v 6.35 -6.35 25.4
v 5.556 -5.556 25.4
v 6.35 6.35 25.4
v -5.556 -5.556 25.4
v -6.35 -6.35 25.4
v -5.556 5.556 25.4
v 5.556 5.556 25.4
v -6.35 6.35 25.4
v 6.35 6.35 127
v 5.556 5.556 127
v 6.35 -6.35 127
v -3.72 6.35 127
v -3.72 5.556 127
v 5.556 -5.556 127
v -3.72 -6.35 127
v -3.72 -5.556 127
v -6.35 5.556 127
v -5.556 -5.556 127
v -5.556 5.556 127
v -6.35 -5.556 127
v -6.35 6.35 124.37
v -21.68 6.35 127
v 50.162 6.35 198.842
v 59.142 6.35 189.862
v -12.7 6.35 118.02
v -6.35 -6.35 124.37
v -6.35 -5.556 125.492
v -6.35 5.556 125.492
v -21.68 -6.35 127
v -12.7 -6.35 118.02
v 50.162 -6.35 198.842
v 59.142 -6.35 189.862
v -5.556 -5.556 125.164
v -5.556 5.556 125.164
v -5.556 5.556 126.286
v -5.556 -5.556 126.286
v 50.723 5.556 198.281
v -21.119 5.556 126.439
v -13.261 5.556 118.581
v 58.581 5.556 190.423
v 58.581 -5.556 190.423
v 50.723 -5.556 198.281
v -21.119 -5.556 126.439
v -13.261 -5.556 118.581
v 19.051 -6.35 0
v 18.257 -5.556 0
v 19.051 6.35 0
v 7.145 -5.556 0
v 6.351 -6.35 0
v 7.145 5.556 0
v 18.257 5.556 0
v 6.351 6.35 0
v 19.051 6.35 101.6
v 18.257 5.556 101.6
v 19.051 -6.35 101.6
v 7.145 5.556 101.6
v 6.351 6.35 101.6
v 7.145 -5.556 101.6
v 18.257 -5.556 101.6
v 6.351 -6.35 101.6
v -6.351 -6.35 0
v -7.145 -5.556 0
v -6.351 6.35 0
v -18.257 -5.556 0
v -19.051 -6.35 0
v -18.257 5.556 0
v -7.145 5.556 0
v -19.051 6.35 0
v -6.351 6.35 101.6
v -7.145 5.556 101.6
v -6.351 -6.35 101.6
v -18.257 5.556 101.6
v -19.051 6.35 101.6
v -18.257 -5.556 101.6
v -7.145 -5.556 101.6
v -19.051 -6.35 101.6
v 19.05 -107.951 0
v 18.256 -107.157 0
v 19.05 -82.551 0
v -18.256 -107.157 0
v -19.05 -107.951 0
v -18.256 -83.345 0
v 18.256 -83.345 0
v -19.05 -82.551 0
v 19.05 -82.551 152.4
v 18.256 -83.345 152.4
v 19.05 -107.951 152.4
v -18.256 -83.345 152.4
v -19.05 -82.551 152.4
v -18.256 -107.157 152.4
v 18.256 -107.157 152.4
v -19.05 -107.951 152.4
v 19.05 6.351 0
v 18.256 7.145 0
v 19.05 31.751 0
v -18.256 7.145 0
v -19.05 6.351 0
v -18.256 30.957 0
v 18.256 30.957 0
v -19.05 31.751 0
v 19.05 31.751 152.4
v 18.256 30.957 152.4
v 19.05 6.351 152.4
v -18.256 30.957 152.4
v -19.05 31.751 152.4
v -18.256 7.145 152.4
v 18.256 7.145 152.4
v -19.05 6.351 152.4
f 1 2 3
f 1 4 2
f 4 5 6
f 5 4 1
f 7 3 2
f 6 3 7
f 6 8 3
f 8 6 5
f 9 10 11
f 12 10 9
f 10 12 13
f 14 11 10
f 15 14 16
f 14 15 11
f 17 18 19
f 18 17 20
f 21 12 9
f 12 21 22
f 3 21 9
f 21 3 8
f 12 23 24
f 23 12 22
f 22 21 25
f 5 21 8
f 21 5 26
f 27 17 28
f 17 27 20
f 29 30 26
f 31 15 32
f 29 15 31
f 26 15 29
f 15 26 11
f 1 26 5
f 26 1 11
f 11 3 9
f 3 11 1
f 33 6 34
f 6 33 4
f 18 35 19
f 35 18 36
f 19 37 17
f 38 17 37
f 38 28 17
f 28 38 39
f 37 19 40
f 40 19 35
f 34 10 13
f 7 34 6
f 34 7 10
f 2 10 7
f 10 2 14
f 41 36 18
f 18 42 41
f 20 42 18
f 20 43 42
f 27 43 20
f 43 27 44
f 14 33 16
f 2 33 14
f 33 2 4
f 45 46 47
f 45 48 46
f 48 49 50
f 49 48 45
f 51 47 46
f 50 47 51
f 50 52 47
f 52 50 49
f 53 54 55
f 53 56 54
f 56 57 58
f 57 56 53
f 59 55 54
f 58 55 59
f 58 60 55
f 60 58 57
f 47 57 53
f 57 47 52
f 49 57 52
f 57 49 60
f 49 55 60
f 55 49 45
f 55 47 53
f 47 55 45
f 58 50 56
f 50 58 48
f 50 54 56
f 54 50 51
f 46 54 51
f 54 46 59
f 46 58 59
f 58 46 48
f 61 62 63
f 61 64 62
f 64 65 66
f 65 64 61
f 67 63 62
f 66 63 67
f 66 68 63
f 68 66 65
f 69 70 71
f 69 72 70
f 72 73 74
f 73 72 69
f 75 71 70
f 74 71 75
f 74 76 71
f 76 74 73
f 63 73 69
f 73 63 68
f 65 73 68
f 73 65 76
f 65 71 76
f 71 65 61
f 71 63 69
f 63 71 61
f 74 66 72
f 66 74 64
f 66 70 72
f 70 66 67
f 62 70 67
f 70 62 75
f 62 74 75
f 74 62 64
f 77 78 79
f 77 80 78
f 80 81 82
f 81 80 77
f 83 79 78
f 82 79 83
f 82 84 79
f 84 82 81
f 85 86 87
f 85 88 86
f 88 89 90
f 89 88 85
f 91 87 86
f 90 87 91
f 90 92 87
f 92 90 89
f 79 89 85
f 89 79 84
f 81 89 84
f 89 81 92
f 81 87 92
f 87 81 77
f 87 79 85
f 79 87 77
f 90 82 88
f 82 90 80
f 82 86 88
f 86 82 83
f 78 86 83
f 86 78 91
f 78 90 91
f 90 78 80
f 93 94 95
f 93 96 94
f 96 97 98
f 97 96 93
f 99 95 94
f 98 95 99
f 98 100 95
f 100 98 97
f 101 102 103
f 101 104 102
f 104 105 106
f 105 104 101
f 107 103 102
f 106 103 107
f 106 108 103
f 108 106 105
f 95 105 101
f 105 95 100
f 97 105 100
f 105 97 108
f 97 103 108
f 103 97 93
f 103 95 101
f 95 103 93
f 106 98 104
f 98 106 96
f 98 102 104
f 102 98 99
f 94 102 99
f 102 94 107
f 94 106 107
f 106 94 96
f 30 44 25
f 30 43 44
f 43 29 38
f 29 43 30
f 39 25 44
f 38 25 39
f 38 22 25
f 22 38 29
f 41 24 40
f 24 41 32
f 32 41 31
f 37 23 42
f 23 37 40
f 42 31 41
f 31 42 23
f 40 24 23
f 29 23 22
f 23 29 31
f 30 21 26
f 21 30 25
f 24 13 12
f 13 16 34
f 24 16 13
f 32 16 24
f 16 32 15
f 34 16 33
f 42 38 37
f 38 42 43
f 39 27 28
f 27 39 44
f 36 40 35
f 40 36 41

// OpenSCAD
eps = 0.001;

module alum_extrusion(height, width, wall_thickness, length) {
    color([0.8, 0.8, 0.8, 0.5])
    linear_extrude(length, center=true) {
        difference() {
            square([width, height], center=true);
            square([width - wall_thickness, height - wall_thickness], center=true);
        }
    }
}

module alum_half_by_half(height) {
    alum_extrusion(0.5*25.4, 0.5*25.4, 1/16*25.4, height);
}
module alum_one_by_one_and_half(height) {
    alum_extrusion(1*25.4, 1.5*25.4, 1/16*25.4, height);
}


translate([0, 0, 3*25.4])
    alum_half_by_half(4*25.4);

translate([0.5*25.4 + eps, 0, 2*25.4])
    alum_half_by_half(4*25.4);
translate([-0.5*25.4 - eps, 0, 2*25.4])
    alum_half_by_half(4*25.4);

translate([0,-3*25.4 -0.75*25.4 - eps, 3*25.4])
    alum_one_by_one_and_half(6*25.4);
translate([0, 0.75*25.4 + eps, 3*25.4])
    alum_one_by_one_and_half(6*25.4);


translate([-.5*25.4, 0, 5*25.4])
rotate([0, 45, 0])
translate([0, 0, 1.75*25.4])
alum_half_by_half(4*25.4);
